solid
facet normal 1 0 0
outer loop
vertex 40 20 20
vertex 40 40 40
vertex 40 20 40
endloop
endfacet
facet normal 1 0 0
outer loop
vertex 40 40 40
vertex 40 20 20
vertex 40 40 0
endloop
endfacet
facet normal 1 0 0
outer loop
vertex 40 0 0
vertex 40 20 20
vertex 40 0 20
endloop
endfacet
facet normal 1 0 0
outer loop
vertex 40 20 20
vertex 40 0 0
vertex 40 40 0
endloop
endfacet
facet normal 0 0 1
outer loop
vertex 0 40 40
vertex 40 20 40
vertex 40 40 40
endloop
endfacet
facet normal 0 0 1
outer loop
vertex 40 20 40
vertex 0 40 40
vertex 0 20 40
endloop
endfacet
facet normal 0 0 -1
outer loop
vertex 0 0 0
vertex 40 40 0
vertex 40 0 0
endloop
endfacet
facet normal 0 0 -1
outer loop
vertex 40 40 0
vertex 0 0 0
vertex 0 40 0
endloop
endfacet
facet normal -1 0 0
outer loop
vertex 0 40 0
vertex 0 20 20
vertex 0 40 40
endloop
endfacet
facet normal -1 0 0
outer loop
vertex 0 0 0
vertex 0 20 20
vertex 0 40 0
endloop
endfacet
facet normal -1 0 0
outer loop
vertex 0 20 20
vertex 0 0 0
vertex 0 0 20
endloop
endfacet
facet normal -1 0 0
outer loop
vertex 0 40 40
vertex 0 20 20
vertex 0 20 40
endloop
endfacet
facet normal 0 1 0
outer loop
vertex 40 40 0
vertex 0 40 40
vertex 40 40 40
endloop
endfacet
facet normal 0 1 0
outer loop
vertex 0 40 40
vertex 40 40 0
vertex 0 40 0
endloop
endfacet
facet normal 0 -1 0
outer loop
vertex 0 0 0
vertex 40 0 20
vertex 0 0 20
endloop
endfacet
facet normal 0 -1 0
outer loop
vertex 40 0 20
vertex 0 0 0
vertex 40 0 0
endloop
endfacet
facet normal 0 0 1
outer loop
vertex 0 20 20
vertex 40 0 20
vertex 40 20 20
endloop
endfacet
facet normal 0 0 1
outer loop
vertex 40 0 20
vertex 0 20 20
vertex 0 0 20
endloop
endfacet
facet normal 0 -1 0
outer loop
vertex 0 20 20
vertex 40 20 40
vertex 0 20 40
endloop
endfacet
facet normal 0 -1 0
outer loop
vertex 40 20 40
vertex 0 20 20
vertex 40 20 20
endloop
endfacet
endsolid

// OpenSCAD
difference(){
cube([40,40,40]);
translate([0,0,20,])
cube([40,20,20]);
}
